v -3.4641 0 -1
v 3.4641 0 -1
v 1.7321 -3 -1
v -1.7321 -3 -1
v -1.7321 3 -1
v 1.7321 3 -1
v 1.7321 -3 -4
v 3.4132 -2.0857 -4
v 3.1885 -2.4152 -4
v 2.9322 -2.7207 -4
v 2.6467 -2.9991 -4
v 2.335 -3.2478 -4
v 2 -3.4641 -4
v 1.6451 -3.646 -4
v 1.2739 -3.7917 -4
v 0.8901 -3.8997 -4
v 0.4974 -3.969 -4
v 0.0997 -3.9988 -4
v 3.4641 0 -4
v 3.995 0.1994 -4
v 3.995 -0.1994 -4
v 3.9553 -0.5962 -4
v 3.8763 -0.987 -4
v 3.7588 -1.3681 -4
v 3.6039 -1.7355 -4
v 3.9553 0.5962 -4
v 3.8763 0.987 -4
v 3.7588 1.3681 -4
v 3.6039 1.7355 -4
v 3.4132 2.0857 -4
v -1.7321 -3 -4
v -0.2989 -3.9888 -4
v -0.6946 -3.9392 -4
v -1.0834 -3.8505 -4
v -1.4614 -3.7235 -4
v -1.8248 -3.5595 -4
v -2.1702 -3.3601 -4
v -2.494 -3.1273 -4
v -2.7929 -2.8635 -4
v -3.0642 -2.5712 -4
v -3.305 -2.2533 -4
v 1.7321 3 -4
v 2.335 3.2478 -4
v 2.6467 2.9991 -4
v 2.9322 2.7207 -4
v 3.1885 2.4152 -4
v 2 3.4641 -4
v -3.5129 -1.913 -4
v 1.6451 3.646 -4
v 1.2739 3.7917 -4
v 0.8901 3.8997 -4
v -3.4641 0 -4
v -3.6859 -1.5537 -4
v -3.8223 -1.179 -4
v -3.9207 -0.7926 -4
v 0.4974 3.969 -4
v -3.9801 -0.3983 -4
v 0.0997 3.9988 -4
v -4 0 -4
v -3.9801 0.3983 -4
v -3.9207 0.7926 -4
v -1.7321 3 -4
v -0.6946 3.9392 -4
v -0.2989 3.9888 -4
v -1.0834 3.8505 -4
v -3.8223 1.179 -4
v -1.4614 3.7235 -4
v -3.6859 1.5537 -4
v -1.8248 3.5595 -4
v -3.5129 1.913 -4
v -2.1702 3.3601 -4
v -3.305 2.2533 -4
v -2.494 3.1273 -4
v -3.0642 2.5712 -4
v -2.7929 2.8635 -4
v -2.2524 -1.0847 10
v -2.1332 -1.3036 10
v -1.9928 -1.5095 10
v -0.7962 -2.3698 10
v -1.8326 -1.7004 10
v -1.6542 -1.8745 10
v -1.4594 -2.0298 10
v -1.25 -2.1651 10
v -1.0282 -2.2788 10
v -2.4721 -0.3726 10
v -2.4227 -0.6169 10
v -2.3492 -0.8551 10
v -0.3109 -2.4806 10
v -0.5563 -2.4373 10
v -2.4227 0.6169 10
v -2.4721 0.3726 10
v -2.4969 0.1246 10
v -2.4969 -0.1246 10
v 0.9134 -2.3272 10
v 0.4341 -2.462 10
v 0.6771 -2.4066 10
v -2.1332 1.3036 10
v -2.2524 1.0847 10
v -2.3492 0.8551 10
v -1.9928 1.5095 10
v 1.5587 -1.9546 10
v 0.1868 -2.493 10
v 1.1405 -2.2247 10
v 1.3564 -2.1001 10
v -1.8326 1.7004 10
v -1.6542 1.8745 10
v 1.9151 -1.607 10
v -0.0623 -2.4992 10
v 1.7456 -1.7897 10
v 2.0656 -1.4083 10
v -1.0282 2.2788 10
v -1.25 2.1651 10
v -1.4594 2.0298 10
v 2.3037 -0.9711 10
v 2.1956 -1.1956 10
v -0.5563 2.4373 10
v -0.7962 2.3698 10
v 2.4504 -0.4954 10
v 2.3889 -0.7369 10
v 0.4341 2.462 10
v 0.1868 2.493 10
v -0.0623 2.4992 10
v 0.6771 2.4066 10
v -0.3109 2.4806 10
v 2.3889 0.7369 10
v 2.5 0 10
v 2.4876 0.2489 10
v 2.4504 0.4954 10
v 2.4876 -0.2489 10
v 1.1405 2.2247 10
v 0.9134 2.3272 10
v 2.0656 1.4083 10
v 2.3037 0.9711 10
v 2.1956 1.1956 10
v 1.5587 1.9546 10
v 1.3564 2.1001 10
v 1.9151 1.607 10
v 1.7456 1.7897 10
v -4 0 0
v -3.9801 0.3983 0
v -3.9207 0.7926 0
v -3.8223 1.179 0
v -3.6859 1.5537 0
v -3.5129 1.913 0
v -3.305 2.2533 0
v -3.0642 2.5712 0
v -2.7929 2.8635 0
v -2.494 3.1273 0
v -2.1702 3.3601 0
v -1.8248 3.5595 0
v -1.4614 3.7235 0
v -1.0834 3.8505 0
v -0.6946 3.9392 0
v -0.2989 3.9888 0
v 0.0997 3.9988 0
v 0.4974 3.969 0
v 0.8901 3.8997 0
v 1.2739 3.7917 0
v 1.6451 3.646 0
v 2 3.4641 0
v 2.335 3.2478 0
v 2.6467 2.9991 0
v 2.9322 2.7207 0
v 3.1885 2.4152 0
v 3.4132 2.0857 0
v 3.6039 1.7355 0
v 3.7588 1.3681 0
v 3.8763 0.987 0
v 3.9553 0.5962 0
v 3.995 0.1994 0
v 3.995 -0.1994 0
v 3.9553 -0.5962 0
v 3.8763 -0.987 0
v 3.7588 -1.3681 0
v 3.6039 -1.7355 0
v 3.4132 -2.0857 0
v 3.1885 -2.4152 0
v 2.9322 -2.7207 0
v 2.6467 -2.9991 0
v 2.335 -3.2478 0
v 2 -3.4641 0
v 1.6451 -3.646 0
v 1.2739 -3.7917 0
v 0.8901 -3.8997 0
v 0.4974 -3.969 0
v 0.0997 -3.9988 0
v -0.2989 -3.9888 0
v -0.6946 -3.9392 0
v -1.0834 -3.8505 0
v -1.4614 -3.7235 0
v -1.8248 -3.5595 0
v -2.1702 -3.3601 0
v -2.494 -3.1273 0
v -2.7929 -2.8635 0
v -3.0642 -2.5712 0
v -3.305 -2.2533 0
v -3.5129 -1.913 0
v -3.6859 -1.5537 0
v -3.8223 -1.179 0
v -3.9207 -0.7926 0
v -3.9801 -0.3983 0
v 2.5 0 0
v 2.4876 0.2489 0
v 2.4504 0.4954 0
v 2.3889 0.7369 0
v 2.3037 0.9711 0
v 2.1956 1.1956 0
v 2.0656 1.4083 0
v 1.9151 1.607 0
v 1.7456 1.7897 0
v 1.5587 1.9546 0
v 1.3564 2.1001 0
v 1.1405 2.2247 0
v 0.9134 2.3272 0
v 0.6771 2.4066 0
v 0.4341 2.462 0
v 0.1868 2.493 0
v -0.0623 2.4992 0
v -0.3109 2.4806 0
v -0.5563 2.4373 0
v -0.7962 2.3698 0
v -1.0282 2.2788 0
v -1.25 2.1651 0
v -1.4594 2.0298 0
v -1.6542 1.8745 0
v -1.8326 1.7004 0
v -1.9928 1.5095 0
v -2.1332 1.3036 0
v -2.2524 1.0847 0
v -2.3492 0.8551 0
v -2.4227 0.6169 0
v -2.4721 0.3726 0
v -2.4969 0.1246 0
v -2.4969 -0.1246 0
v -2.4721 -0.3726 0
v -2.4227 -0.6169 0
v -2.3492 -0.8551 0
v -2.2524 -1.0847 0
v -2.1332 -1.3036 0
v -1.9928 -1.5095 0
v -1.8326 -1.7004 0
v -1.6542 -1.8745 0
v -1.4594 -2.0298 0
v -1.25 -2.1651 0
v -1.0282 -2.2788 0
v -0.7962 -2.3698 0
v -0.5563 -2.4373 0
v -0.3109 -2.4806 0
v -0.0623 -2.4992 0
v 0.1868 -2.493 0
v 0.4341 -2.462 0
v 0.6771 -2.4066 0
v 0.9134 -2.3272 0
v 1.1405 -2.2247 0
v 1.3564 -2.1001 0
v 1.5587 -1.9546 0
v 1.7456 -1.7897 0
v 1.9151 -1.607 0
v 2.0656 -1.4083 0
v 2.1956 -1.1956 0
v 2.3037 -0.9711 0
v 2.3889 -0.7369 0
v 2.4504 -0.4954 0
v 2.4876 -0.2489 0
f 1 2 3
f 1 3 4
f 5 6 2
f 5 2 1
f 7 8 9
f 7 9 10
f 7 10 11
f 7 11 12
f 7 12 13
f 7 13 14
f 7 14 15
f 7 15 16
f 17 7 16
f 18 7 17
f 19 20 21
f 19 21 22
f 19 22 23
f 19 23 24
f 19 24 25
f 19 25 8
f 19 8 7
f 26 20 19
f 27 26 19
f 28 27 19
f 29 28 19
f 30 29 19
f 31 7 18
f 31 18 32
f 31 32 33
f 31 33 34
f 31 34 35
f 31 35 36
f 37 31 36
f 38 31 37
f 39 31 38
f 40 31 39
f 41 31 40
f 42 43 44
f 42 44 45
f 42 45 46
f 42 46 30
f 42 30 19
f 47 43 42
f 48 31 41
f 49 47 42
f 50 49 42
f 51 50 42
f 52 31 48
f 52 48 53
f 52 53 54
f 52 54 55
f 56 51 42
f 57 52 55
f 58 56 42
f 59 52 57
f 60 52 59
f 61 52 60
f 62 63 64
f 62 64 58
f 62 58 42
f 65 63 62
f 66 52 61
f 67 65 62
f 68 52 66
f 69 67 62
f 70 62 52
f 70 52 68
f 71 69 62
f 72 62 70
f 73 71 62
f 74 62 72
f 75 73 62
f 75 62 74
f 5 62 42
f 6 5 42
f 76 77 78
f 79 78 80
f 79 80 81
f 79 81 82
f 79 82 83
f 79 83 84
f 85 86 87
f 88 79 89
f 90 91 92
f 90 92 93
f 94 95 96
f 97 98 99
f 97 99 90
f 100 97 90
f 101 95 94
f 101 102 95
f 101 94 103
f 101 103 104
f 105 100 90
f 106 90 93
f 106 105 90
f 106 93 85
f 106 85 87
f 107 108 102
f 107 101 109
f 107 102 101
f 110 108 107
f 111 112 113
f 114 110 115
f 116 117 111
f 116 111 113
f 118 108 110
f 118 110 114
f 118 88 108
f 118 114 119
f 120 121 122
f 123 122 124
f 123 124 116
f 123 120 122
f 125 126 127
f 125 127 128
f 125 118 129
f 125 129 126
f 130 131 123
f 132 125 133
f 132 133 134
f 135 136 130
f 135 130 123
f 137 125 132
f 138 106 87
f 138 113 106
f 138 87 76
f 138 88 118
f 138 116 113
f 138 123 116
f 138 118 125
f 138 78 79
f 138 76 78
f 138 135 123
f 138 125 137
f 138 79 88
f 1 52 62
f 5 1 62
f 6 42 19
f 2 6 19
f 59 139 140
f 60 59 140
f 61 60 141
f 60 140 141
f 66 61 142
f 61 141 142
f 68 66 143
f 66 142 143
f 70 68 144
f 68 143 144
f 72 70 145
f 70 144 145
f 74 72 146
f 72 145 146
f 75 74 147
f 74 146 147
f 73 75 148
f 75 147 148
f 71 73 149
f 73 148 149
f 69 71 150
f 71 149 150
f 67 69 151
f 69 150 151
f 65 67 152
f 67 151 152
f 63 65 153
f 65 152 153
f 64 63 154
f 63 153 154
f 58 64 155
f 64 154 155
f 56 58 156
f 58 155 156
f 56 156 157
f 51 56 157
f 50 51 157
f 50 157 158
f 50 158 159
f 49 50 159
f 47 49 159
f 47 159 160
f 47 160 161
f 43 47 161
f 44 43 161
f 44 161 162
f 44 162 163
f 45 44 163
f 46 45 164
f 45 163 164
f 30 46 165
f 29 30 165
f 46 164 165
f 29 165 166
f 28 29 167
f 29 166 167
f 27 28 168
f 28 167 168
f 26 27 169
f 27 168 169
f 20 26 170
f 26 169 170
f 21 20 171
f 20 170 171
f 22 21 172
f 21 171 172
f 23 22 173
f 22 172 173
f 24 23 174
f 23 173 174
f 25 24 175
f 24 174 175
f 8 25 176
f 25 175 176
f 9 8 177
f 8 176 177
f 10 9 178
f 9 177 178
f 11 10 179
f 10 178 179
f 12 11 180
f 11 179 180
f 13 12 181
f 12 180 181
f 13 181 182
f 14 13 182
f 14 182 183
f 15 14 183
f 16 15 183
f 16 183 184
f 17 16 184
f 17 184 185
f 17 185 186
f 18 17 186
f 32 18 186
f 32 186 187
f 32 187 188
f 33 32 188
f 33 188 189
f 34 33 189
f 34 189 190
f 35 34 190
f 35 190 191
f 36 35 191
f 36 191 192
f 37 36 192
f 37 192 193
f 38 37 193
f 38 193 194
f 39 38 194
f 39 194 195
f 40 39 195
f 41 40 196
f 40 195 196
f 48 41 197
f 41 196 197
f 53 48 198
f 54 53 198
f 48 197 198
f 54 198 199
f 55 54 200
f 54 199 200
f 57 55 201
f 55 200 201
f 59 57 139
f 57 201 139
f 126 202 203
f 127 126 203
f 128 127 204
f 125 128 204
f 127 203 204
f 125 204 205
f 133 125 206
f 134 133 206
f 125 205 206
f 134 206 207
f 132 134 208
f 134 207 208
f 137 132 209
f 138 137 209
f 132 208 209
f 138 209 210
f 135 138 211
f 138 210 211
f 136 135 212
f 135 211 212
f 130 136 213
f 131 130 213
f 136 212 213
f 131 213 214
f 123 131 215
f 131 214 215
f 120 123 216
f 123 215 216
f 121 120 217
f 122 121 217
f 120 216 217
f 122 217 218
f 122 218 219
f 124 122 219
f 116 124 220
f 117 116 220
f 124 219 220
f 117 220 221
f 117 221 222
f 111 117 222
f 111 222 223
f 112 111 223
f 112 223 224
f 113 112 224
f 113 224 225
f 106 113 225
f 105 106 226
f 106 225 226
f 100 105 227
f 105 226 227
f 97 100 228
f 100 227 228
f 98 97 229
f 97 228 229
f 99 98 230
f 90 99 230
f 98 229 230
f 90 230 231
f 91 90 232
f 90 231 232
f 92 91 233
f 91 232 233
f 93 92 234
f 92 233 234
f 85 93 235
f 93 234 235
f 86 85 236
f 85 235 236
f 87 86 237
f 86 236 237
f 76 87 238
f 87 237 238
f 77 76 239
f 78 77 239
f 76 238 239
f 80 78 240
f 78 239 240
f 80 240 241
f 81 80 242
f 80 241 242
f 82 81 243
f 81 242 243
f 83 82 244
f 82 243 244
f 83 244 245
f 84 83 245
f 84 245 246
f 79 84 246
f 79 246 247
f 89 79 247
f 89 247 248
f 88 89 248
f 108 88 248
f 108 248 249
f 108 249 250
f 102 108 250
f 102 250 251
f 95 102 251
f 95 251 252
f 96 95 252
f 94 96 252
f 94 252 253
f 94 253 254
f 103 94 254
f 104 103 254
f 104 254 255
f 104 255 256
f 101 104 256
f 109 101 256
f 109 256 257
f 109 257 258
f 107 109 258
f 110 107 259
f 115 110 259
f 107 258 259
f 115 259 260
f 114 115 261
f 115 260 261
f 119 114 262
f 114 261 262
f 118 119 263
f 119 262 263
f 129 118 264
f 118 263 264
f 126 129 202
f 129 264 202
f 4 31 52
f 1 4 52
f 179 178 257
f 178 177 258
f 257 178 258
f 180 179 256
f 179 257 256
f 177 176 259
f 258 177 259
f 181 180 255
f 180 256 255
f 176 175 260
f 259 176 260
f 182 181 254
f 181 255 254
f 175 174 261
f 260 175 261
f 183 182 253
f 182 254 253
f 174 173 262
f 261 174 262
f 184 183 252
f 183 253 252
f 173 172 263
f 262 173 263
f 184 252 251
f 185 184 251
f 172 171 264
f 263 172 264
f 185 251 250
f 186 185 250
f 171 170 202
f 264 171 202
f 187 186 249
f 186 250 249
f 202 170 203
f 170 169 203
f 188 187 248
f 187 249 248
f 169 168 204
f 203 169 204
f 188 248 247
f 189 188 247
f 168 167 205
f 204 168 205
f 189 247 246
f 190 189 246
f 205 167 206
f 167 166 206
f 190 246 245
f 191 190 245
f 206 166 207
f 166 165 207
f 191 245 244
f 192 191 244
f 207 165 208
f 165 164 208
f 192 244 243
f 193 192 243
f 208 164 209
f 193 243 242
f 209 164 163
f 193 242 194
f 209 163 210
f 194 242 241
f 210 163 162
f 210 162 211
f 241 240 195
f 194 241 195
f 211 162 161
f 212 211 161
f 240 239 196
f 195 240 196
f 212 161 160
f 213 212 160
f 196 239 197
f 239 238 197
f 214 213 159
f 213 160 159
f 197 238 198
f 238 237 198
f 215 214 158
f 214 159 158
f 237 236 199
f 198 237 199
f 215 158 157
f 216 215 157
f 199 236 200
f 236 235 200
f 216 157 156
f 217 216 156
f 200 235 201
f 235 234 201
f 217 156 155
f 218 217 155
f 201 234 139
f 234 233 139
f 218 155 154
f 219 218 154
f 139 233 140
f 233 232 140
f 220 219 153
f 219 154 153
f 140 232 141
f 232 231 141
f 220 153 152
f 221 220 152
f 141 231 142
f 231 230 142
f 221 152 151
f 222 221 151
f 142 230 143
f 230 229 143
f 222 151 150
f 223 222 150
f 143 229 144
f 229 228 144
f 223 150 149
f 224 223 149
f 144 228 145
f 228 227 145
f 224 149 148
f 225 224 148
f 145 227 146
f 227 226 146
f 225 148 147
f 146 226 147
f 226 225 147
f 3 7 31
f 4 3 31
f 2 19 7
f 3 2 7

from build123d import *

# Parameters (mm, degrees)
SKETCH1_R           = 2.5
BOSS_EXTRUDE1_DEPTH = 10
SKETCH2_R           = 4
BOSS_EXTRUDE2_DEPTH = 4
CUT_EXTRUDE1_DEPTH  = 3


with BuildPart() as part:
    # Sketch1 → Boss-Extrude1 (new body)
    with BuildSketch(Plane.XY):
        Circle(SKETCH1_R)
    extrude(amount=BOSS_EXTRUDE1_DEPTH)

    # Sketch2 → Boss-Extrude2 (add)
    with BuildSketch(Plane(origin=(0, 0, 0), x_dir=(-1, 0, 0), z_dir=(0, 0, -1))):
        Circle(SKETCH2_R)
    extrude(amount=BOSS_EXTRUDE2_DEPTH)

    # Sketch3 → Cut-Extrude1 (cut)
    with BuildSketch(Plane(origin=(0, 0, -4), x_dir=(-1, 0, 0), z_dir=(0, 0, -1))):
        Polygon((1.732050808, -3), (3.464101615, 0), (1.732050808, 3), (-1.732050808, 3), (-3.464101615, 0), (-1.732050808, -3), align=None)
    extrude(amount=-CUT_EXTRUDE1_DEPTH, mode=Mode.SUBTRACT)


solid = part.part
